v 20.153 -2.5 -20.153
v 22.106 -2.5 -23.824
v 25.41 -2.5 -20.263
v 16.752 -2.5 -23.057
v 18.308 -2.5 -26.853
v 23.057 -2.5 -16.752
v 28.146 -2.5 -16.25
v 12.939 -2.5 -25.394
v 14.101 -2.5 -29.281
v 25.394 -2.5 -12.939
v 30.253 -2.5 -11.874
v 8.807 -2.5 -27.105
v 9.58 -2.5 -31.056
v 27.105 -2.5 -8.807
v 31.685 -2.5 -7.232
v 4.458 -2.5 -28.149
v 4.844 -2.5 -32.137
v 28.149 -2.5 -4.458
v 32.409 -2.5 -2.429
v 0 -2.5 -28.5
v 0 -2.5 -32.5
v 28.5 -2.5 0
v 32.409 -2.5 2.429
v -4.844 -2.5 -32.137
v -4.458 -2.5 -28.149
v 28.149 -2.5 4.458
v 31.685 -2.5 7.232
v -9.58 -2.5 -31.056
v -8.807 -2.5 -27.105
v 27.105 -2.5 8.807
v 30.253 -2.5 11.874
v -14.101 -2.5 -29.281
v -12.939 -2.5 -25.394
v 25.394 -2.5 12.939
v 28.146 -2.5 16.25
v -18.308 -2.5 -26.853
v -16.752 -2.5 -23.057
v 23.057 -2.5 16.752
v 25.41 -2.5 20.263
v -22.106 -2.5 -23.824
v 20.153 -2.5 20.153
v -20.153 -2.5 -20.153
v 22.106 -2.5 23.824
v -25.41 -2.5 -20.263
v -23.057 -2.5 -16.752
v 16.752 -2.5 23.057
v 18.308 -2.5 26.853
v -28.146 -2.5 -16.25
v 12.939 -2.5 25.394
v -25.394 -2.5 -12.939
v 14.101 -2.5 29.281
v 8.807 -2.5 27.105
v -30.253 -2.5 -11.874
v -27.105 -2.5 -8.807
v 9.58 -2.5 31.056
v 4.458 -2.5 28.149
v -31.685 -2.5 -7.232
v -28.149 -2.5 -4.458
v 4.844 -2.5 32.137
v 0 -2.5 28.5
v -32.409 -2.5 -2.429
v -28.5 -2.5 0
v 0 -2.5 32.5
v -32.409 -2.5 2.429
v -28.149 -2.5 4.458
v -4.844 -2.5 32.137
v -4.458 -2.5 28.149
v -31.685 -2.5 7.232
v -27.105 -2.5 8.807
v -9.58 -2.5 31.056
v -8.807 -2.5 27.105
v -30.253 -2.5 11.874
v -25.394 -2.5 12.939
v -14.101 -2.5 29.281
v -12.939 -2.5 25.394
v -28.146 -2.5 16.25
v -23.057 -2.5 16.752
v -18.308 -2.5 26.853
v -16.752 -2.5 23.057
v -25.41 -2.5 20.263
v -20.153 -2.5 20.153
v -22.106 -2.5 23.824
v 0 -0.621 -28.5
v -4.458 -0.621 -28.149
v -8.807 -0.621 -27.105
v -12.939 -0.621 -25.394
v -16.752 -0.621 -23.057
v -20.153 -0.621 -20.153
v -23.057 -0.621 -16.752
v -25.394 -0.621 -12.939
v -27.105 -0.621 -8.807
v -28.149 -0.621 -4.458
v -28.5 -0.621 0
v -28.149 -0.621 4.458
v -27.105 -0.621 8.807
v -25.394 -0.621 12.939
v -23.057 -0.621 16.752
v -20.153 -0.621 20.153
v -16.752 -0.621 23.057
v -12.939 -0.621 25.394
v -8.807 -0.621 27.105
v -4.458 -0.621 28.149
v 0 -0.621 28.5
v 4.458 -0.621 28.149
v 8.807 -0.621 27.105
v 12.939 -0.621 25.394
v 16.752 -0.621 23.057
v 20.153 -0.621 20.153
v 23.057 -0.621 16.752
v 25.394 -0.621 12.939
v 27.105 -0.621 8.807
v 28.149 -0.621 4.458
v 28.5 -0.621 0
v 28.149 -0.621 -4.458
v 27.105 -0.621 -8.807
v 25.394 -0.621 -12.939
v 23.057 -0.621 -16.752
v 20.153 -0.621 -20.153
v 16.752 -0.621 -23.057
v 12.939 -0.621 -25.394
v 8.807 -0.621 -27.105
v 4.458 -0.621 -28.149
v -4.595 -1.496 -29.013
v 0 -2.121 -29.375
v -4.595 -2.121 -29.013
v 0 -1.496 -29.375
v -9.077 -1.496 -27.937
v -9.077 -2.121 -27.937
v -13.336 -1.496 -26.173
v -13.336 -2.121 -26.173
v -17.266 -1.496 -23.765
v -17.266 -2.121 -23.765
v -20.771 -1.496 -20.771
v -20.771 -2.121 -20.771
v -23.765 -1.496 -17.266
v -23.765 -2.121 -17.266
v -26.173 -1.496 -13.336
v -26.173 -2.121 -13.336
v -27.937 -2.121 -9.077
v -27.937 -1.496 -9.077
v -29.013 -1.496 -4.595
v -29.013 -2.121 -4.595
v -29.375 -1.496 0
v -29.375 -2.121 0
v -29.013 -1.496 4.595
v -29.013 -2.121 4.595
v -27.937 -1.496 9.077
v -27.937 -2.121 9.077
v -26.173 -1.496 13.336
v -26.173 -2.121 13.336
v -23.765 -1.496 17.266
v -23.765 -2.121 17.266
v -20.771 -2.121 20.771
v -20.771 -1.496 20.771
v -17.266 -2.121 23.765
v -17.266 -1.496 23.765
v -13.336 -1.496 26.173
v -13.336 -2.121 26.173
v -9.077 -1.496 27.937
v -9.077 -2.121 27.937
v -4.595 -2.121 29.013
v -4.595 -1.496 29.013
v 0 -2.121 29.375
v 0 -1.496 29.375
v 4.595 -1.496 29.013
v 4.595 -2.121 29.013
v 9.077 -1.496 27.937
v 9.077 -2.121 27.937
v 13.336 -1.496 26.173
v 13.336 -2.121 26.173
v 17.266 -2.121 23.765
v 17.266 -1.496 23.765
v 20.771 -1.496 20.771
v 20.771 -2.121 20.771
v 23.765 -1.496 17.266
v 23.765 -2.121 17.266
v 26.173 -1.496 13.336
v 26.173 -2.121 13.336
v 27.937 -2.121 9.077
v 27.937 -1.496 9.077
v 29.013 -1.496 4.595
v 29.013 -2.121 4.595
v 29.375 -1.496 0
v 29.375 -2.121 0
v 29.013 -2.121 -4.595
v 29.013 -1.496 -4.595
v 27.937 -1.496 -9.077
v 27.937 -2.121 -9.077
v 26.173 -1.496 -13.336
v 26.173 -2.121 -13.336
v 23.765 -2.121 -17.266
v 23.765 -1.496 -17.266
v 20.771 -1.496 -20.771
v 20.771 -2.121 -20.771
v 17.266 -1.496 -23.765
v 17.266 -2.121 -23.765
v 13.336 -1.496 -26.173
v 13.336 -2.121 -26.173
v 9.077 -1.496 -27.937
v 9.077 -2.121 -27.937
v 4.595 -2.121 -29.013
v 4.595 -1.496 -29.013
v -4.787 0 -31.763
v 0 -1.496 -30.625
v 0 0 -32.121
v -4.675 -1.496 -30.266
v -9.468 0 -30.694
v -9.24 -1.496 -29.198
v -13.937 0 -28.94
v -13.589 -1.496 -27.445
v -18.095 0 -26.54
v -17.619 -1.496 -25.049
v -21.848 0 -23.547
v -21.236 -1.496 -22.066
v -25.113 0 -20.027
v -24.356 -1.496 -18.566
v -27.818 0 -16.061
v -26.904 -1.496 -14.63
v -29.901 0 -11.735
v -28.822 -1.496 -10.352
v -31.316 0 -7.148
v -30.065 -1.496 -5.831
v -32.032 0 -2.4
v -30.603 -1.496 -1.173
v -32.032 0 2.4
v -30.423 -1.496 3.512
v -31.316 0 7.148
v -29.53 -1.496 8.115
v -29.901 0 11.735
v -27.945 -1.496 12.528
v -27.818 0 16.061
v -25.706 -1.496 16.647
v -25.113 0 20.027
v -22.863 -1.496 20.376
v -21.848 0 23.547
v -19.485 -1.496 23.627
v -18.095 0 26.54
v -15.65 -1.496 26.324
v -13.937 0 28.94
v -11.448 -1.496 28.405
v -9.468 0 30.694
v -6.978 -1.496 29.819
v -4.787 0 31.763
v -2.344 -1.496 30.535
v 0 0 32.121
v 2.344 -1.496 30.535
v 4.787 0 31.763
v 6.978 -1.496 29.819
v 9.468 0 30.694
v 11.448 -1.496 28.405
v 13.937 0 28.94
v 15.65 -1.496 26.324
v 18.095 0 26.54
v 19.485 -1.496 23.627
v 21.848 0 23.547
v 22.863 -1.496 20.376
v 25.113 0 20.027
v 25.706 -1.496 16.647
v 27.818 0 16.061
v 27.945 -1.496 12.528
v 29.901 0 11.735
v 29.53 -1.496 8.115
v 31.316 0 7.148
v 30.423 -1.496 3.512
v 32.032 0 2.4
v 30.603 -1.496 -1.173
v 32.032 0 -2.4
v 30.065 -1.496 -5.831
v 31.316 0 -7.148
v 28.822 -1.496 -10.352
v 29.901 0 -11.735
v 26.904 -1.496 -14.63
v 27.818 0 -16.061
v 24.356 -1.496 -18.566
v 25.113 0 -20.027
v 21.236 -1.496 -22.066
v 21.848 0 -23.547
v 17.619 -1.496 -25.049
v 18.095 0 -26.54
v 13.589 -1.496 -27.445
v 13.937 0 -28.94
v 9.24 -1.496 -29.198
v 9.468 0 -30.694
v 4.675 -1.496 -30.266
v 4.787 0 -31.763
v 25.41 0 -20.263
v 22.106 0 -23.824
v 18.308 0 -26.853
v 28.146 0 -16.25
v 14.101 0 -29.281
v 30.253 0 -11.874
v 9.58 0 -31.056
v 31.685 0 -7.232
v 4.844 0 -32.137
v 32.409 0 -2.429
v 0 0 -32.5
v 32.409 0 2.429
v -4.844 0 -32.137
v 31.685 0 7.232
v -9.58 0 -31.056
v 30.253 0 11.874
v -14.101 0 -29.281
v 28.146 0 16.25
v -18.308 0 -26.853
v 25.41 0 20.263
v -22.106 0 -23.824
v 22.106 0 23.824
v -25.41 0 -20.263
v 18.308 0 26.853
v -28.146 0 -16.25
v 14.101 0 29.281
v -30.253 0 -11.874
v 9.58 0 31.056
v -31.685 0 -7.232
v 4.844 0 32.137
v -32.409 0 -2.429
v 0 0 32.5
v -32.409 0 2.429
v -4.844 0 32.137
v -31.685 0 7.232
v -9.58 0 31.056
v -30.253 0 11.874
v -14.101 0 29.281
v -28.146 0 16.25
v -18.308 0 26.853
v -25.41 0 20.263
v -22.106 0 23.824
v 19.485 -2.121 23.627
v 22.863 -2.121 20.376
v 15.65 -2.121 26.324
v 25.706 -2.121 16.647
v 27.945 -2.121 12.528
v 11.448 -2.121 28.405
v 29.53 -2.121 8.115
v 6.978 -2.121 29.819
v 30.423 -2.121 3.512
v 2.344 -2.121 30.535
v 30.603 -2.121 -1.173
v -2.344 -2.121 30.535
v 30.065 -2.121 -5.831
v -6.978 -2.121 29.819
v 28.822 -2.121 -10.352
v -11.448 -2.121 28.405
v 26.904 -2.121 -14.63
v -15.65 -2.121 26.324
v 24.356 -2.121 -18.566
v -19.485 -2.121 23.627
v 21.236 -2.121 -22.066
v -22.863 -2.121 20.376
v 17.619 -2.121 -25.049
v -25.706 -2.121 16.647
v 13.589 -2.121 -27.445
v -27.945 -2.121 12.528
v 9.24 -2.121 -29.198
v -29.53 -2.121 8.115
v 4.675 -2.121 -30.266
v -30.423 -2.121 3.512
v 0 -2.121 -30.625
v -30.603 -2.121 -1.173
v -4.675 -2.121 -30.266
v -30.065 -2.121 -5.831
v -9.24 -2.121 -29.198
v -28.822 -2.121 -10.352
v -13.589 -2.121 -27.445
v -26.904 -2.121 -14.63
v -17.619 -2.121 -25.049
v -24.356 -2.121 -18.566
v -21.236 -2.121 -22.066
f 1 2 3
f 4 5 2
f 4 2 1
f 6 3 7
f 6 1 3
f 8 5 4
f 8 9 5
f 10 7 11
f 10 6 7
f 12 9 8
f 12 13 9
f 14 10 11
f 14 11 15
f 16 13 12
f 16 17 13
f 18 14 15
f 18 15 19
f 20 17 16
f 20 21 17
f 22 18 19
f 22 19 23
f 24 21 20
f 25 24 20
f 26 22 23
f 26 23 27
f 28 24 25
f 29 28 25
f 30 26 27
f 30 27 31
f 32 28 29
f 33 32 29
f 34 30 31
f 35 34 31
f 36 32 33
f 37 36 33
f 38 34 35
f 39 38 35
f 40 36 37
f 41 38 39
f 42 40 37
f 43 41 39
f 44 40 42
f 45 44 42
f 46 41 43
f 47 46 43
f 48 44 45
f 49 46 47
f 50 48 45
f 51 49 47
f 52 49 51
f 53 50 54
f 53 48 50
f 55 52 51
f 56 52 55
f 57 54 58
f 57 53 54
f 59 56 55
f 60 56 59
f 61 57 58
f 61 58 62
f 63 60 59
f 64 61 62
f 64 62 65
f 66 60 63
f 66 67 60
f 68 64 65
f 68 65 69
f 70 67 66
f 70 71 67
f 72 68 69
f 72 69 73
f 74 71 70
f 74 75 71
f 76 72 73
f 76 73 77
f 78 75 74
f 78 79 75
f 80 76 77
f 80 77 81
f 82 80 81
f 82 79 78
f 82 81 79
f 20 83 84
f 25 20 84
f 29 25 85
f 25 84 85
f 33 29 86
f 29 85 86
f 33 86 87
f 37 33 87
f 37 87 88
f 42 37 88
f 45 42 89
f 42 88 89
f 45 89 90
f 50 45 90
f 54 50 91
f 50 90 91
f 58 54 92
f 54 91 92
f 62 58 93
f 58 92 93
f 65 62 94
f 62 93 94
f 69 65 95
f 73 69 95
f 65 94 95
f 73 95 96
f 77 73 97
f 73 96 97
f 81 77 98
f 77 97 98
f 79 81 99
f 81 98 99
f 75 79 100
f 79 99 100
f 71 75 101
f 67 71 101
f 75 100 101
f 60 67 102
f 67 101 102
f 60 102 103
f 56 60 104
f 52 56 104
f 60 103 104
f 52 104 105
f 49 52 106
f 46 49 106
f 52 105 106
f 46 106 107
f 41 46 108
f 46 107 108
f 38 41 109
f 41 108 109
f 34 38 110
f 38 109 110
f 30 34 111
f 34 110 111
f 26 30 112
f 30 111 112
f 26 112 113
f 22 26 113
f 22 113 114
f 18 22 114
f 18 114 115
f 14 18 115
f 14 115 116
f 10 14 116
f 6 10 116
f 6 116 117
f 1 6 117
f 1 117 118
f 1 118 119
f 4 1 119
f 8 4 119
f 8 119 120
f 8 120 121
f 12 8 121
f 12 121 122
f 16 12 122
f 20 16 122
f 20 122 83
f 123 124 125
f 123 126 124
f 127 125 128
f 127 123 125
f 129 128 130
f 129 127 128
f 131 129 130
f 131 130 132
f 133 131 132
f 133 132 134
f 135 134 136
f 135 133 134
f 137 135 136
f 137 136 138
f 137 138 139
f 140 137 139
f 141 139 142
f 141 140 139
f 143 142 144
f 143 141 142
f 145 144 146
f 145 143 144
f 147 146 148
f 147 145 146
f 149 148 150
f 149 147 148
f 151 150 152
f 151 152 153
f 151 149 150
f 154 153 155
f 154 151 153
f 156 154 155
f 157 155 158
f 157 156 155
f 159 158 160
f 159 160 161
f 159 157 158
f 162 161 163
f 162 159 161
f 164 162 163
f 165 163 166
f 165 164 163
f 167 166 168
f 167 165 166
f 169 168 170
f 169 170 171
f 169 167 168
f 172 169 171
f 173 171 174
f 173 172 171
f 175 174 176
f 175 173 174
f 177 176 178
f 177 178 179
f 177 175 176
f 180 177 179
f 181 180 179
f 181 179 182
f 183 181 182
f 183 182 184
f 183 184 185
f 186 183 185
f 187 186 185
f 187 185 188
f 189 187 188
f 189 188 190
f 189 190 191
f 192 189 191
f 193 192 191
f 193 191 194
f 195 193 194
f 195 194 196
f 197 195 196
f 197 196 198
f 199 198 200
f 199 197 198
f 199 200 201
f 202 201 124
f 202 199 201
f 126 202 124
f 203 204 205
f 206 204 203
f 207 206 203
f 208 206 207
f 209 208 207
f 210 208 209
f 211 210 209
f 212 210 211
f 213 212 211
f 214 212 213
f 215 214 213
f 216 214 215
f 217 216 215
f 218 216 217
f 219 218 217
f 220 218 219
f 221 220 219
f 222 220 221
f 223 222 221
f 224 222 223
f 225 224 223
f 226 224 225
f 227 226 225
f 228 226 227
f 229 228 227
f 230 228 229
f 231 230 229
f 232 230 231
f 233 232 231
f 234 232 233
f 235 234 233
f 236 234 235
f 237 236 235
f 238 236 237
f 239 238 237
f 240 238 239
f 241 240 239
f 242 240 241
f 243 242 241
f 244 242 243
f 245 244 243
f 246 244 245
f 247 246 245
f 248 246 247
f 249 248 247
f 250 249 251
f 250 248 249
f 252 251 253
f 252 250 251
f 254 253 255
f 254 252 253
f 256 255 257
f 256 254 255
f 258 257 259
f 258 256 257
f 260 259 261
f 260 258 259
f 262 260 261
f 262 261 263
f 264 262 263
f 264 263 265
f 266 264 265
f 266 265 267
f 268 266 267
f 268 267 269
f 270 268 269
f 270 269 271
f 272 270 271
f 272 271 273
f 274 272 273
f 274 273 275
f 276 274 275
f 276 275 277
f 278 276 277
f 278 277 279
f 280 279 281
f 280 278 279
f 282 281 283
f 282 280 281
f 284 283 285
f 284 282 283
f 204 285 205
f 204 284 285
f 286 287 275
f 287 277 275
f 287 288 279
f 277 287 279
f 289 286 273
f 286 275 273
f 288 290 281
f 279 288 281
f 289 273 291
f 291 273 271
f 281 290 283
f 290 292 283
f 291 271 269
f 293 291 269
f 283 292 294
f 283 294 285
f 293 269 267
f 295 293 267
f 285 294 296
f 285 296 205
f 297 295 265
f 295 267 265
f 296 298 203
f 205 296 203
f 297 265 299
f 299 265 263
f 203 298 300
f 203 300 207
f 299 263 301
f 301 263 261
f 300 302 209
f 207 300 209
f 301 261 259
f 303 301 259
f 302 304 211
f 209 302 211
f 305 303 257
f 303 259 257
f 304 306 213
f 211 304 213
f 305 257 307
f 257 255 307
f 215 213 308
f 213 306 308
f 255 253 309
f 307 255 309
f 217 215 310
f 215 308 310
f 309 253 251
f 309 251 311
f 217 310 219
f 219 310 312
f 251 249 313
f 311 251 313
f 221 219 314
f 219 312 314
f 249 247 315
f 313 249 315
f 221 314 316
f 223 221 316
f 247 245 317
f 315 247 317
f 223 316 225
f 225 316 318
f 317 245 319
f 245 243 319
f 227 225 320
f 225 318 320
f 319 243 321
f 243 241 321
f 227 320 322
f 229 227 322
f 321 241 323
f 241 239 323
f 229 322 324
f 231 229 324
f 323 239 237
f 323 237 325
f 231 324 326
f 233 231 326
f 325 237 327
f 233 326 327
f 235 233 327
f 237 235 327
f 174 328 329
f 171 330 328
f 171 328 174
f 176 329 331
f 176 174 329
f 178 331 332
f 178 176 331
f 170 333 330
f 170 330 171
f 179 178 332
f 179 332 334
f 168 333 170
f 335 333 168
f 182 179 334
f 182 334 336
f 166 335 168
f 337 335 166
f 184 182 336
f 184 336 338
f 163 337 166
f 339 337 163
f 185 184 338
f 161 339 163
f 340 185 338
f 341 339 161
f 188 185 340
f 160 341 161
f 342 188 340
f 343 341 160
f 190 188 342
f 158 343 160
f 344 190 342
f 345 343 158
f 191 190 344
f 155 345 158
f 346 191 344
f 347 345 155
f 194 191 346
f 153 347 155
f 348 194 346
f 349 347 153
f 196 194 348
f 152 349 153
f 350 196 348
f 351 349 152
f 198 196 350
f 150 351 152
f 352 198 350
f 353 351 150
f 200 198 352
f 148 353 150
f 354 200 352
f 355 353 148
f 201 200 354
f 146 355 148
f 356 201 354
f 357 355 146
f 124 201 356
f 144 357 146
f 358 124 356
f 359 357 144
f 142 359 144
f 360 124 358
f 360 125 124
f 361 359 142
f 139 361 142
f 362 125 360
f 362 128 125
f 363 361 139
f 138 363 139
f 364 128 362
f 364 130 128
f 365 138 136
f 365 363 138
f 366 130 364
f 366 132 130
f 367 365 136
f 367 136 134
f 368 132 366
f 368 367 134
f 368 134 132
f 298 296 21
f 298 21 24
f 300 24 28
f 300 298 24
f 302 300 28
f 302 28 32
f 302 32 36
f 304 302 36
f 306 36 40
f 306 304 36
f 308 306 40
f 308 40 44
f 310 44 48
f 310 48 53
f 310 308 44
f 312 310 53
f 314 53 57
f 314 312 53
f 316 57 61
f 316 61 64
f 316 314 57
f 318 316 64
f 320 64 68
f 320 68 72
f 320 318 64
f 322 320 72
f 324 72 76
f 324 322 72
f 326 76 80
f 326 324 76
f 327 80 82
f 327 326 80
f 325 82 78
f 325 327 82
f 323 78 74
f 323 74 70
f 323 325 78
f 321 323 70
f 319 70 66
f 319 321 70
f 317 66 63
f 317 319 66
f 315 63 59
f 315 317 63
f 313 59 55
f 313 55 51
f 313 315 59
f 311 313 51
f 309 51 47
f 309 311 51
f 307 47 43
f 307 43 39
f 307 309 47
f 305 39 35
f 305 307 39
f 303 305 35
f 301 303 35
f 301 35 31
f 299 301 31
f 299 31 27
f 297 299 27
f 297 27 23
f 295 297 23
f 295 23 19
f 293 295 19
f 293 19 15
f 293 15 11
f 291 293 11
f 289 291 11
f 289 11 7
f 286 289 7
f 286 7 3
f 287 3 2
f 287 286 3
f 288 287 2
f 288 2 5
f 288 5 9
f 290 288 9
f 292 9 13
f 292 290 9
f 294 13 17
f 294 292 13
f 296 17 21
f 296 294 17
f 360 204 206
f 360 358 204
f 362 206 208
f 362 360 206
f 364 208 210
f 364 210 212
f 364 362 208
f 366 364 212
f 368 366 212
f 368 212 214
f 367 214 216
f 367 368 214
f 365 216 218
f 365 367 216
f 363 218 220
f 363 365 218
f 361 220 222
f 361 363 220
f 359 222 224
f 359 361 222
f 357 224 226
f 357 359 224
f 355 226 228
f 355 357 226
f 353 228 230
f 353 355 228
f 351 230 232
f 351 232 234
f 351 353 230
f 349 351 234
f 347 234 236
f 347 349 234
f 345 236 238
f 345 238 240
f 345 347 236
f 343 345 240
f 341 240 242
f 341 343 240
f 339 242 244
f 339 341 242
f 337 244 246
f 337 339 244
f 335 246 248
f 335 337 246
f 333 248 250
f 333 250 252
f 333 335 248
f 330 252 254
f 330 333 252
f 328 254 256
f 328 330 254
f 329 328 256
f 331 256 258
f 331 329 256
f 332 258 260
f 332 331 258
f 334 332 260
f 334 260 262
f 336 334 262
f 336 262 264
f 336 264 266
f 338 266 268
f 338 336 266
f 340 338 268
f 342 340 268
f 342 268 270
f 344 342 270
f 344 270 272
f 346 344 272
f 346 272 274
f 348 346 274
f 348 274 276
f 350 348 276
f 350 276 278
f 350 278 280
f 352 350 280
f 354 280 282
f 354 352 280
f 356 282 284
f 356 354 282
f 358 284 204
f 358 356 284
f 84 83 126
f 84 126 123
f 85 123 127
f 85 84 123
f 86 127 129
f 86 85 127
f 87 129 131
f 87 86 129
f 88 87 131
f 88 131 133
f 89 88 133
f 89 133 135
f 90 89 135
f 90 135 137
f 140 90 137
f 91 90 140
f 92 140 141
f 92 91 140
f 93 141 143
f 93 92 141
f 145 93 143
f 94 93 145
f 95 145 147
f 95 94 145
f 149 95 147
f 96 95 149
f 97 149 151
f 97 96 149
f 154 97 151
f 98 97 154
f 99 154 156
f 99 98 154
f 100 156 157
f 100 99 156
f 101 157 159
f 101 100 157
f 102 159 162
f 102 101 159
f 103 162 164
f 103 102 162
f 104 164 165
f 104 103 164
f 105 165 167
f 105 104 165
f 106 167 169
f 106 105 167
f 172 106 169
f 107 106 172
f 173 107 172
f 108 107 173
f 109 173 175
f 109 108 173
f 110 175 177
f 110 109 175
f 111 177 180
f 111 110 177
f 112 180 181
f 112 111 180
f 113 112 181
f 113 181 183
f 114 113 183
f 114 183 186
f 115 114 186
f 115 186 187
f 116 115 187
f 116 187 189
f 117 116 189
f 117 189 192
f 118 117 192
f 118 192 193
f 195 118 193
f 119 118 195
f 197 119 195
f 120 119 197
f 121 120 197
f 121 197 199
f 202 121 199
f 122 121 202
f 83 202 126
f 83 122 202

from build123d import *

# Parameters (mm, degrees)
SKETCH1_W = 5
SKETCH1_H = 5


with BuildPart() as part:
    # Sketch1 → Revolve1 (revolve)
    with BuildSketch(Plane.XY):
        with Locations((30, 0)):
            Rectangle(SKETCH1_W, SKETCH1_H)
        Polygon((29.375, -1.496320344), (27.878679656, 0), (29.375, 1.496320344), (29.375, 2.121320344), (30.625, 2.121320344), (30.625, 1.496320344), (32.121320344, 0), (30.625, -1.496320344), (30.625, -2.121320344), (29.375, -2.121320344), align=None, mode=Mode.SUBTRACT)
    revolve(axis=Axis((0, -28.665734922, 0), (0, 1, 0)))

    # Sketch2 → Cut-Revolve1 (revolve, cut)
    with BuildSketch(Plane.XY):
        Polygon((28.5, 0), (32.5, 0), (32.5, 2.5), (27.5, 2.5), (27.5, 0), (27.5, -2.5), (28.5, -2.5), align=None)
    revolve(axis=Axis((0, 0, 0), (0, 1, 0)), mode=Mode.SUBTRACT)


solid = part.part
